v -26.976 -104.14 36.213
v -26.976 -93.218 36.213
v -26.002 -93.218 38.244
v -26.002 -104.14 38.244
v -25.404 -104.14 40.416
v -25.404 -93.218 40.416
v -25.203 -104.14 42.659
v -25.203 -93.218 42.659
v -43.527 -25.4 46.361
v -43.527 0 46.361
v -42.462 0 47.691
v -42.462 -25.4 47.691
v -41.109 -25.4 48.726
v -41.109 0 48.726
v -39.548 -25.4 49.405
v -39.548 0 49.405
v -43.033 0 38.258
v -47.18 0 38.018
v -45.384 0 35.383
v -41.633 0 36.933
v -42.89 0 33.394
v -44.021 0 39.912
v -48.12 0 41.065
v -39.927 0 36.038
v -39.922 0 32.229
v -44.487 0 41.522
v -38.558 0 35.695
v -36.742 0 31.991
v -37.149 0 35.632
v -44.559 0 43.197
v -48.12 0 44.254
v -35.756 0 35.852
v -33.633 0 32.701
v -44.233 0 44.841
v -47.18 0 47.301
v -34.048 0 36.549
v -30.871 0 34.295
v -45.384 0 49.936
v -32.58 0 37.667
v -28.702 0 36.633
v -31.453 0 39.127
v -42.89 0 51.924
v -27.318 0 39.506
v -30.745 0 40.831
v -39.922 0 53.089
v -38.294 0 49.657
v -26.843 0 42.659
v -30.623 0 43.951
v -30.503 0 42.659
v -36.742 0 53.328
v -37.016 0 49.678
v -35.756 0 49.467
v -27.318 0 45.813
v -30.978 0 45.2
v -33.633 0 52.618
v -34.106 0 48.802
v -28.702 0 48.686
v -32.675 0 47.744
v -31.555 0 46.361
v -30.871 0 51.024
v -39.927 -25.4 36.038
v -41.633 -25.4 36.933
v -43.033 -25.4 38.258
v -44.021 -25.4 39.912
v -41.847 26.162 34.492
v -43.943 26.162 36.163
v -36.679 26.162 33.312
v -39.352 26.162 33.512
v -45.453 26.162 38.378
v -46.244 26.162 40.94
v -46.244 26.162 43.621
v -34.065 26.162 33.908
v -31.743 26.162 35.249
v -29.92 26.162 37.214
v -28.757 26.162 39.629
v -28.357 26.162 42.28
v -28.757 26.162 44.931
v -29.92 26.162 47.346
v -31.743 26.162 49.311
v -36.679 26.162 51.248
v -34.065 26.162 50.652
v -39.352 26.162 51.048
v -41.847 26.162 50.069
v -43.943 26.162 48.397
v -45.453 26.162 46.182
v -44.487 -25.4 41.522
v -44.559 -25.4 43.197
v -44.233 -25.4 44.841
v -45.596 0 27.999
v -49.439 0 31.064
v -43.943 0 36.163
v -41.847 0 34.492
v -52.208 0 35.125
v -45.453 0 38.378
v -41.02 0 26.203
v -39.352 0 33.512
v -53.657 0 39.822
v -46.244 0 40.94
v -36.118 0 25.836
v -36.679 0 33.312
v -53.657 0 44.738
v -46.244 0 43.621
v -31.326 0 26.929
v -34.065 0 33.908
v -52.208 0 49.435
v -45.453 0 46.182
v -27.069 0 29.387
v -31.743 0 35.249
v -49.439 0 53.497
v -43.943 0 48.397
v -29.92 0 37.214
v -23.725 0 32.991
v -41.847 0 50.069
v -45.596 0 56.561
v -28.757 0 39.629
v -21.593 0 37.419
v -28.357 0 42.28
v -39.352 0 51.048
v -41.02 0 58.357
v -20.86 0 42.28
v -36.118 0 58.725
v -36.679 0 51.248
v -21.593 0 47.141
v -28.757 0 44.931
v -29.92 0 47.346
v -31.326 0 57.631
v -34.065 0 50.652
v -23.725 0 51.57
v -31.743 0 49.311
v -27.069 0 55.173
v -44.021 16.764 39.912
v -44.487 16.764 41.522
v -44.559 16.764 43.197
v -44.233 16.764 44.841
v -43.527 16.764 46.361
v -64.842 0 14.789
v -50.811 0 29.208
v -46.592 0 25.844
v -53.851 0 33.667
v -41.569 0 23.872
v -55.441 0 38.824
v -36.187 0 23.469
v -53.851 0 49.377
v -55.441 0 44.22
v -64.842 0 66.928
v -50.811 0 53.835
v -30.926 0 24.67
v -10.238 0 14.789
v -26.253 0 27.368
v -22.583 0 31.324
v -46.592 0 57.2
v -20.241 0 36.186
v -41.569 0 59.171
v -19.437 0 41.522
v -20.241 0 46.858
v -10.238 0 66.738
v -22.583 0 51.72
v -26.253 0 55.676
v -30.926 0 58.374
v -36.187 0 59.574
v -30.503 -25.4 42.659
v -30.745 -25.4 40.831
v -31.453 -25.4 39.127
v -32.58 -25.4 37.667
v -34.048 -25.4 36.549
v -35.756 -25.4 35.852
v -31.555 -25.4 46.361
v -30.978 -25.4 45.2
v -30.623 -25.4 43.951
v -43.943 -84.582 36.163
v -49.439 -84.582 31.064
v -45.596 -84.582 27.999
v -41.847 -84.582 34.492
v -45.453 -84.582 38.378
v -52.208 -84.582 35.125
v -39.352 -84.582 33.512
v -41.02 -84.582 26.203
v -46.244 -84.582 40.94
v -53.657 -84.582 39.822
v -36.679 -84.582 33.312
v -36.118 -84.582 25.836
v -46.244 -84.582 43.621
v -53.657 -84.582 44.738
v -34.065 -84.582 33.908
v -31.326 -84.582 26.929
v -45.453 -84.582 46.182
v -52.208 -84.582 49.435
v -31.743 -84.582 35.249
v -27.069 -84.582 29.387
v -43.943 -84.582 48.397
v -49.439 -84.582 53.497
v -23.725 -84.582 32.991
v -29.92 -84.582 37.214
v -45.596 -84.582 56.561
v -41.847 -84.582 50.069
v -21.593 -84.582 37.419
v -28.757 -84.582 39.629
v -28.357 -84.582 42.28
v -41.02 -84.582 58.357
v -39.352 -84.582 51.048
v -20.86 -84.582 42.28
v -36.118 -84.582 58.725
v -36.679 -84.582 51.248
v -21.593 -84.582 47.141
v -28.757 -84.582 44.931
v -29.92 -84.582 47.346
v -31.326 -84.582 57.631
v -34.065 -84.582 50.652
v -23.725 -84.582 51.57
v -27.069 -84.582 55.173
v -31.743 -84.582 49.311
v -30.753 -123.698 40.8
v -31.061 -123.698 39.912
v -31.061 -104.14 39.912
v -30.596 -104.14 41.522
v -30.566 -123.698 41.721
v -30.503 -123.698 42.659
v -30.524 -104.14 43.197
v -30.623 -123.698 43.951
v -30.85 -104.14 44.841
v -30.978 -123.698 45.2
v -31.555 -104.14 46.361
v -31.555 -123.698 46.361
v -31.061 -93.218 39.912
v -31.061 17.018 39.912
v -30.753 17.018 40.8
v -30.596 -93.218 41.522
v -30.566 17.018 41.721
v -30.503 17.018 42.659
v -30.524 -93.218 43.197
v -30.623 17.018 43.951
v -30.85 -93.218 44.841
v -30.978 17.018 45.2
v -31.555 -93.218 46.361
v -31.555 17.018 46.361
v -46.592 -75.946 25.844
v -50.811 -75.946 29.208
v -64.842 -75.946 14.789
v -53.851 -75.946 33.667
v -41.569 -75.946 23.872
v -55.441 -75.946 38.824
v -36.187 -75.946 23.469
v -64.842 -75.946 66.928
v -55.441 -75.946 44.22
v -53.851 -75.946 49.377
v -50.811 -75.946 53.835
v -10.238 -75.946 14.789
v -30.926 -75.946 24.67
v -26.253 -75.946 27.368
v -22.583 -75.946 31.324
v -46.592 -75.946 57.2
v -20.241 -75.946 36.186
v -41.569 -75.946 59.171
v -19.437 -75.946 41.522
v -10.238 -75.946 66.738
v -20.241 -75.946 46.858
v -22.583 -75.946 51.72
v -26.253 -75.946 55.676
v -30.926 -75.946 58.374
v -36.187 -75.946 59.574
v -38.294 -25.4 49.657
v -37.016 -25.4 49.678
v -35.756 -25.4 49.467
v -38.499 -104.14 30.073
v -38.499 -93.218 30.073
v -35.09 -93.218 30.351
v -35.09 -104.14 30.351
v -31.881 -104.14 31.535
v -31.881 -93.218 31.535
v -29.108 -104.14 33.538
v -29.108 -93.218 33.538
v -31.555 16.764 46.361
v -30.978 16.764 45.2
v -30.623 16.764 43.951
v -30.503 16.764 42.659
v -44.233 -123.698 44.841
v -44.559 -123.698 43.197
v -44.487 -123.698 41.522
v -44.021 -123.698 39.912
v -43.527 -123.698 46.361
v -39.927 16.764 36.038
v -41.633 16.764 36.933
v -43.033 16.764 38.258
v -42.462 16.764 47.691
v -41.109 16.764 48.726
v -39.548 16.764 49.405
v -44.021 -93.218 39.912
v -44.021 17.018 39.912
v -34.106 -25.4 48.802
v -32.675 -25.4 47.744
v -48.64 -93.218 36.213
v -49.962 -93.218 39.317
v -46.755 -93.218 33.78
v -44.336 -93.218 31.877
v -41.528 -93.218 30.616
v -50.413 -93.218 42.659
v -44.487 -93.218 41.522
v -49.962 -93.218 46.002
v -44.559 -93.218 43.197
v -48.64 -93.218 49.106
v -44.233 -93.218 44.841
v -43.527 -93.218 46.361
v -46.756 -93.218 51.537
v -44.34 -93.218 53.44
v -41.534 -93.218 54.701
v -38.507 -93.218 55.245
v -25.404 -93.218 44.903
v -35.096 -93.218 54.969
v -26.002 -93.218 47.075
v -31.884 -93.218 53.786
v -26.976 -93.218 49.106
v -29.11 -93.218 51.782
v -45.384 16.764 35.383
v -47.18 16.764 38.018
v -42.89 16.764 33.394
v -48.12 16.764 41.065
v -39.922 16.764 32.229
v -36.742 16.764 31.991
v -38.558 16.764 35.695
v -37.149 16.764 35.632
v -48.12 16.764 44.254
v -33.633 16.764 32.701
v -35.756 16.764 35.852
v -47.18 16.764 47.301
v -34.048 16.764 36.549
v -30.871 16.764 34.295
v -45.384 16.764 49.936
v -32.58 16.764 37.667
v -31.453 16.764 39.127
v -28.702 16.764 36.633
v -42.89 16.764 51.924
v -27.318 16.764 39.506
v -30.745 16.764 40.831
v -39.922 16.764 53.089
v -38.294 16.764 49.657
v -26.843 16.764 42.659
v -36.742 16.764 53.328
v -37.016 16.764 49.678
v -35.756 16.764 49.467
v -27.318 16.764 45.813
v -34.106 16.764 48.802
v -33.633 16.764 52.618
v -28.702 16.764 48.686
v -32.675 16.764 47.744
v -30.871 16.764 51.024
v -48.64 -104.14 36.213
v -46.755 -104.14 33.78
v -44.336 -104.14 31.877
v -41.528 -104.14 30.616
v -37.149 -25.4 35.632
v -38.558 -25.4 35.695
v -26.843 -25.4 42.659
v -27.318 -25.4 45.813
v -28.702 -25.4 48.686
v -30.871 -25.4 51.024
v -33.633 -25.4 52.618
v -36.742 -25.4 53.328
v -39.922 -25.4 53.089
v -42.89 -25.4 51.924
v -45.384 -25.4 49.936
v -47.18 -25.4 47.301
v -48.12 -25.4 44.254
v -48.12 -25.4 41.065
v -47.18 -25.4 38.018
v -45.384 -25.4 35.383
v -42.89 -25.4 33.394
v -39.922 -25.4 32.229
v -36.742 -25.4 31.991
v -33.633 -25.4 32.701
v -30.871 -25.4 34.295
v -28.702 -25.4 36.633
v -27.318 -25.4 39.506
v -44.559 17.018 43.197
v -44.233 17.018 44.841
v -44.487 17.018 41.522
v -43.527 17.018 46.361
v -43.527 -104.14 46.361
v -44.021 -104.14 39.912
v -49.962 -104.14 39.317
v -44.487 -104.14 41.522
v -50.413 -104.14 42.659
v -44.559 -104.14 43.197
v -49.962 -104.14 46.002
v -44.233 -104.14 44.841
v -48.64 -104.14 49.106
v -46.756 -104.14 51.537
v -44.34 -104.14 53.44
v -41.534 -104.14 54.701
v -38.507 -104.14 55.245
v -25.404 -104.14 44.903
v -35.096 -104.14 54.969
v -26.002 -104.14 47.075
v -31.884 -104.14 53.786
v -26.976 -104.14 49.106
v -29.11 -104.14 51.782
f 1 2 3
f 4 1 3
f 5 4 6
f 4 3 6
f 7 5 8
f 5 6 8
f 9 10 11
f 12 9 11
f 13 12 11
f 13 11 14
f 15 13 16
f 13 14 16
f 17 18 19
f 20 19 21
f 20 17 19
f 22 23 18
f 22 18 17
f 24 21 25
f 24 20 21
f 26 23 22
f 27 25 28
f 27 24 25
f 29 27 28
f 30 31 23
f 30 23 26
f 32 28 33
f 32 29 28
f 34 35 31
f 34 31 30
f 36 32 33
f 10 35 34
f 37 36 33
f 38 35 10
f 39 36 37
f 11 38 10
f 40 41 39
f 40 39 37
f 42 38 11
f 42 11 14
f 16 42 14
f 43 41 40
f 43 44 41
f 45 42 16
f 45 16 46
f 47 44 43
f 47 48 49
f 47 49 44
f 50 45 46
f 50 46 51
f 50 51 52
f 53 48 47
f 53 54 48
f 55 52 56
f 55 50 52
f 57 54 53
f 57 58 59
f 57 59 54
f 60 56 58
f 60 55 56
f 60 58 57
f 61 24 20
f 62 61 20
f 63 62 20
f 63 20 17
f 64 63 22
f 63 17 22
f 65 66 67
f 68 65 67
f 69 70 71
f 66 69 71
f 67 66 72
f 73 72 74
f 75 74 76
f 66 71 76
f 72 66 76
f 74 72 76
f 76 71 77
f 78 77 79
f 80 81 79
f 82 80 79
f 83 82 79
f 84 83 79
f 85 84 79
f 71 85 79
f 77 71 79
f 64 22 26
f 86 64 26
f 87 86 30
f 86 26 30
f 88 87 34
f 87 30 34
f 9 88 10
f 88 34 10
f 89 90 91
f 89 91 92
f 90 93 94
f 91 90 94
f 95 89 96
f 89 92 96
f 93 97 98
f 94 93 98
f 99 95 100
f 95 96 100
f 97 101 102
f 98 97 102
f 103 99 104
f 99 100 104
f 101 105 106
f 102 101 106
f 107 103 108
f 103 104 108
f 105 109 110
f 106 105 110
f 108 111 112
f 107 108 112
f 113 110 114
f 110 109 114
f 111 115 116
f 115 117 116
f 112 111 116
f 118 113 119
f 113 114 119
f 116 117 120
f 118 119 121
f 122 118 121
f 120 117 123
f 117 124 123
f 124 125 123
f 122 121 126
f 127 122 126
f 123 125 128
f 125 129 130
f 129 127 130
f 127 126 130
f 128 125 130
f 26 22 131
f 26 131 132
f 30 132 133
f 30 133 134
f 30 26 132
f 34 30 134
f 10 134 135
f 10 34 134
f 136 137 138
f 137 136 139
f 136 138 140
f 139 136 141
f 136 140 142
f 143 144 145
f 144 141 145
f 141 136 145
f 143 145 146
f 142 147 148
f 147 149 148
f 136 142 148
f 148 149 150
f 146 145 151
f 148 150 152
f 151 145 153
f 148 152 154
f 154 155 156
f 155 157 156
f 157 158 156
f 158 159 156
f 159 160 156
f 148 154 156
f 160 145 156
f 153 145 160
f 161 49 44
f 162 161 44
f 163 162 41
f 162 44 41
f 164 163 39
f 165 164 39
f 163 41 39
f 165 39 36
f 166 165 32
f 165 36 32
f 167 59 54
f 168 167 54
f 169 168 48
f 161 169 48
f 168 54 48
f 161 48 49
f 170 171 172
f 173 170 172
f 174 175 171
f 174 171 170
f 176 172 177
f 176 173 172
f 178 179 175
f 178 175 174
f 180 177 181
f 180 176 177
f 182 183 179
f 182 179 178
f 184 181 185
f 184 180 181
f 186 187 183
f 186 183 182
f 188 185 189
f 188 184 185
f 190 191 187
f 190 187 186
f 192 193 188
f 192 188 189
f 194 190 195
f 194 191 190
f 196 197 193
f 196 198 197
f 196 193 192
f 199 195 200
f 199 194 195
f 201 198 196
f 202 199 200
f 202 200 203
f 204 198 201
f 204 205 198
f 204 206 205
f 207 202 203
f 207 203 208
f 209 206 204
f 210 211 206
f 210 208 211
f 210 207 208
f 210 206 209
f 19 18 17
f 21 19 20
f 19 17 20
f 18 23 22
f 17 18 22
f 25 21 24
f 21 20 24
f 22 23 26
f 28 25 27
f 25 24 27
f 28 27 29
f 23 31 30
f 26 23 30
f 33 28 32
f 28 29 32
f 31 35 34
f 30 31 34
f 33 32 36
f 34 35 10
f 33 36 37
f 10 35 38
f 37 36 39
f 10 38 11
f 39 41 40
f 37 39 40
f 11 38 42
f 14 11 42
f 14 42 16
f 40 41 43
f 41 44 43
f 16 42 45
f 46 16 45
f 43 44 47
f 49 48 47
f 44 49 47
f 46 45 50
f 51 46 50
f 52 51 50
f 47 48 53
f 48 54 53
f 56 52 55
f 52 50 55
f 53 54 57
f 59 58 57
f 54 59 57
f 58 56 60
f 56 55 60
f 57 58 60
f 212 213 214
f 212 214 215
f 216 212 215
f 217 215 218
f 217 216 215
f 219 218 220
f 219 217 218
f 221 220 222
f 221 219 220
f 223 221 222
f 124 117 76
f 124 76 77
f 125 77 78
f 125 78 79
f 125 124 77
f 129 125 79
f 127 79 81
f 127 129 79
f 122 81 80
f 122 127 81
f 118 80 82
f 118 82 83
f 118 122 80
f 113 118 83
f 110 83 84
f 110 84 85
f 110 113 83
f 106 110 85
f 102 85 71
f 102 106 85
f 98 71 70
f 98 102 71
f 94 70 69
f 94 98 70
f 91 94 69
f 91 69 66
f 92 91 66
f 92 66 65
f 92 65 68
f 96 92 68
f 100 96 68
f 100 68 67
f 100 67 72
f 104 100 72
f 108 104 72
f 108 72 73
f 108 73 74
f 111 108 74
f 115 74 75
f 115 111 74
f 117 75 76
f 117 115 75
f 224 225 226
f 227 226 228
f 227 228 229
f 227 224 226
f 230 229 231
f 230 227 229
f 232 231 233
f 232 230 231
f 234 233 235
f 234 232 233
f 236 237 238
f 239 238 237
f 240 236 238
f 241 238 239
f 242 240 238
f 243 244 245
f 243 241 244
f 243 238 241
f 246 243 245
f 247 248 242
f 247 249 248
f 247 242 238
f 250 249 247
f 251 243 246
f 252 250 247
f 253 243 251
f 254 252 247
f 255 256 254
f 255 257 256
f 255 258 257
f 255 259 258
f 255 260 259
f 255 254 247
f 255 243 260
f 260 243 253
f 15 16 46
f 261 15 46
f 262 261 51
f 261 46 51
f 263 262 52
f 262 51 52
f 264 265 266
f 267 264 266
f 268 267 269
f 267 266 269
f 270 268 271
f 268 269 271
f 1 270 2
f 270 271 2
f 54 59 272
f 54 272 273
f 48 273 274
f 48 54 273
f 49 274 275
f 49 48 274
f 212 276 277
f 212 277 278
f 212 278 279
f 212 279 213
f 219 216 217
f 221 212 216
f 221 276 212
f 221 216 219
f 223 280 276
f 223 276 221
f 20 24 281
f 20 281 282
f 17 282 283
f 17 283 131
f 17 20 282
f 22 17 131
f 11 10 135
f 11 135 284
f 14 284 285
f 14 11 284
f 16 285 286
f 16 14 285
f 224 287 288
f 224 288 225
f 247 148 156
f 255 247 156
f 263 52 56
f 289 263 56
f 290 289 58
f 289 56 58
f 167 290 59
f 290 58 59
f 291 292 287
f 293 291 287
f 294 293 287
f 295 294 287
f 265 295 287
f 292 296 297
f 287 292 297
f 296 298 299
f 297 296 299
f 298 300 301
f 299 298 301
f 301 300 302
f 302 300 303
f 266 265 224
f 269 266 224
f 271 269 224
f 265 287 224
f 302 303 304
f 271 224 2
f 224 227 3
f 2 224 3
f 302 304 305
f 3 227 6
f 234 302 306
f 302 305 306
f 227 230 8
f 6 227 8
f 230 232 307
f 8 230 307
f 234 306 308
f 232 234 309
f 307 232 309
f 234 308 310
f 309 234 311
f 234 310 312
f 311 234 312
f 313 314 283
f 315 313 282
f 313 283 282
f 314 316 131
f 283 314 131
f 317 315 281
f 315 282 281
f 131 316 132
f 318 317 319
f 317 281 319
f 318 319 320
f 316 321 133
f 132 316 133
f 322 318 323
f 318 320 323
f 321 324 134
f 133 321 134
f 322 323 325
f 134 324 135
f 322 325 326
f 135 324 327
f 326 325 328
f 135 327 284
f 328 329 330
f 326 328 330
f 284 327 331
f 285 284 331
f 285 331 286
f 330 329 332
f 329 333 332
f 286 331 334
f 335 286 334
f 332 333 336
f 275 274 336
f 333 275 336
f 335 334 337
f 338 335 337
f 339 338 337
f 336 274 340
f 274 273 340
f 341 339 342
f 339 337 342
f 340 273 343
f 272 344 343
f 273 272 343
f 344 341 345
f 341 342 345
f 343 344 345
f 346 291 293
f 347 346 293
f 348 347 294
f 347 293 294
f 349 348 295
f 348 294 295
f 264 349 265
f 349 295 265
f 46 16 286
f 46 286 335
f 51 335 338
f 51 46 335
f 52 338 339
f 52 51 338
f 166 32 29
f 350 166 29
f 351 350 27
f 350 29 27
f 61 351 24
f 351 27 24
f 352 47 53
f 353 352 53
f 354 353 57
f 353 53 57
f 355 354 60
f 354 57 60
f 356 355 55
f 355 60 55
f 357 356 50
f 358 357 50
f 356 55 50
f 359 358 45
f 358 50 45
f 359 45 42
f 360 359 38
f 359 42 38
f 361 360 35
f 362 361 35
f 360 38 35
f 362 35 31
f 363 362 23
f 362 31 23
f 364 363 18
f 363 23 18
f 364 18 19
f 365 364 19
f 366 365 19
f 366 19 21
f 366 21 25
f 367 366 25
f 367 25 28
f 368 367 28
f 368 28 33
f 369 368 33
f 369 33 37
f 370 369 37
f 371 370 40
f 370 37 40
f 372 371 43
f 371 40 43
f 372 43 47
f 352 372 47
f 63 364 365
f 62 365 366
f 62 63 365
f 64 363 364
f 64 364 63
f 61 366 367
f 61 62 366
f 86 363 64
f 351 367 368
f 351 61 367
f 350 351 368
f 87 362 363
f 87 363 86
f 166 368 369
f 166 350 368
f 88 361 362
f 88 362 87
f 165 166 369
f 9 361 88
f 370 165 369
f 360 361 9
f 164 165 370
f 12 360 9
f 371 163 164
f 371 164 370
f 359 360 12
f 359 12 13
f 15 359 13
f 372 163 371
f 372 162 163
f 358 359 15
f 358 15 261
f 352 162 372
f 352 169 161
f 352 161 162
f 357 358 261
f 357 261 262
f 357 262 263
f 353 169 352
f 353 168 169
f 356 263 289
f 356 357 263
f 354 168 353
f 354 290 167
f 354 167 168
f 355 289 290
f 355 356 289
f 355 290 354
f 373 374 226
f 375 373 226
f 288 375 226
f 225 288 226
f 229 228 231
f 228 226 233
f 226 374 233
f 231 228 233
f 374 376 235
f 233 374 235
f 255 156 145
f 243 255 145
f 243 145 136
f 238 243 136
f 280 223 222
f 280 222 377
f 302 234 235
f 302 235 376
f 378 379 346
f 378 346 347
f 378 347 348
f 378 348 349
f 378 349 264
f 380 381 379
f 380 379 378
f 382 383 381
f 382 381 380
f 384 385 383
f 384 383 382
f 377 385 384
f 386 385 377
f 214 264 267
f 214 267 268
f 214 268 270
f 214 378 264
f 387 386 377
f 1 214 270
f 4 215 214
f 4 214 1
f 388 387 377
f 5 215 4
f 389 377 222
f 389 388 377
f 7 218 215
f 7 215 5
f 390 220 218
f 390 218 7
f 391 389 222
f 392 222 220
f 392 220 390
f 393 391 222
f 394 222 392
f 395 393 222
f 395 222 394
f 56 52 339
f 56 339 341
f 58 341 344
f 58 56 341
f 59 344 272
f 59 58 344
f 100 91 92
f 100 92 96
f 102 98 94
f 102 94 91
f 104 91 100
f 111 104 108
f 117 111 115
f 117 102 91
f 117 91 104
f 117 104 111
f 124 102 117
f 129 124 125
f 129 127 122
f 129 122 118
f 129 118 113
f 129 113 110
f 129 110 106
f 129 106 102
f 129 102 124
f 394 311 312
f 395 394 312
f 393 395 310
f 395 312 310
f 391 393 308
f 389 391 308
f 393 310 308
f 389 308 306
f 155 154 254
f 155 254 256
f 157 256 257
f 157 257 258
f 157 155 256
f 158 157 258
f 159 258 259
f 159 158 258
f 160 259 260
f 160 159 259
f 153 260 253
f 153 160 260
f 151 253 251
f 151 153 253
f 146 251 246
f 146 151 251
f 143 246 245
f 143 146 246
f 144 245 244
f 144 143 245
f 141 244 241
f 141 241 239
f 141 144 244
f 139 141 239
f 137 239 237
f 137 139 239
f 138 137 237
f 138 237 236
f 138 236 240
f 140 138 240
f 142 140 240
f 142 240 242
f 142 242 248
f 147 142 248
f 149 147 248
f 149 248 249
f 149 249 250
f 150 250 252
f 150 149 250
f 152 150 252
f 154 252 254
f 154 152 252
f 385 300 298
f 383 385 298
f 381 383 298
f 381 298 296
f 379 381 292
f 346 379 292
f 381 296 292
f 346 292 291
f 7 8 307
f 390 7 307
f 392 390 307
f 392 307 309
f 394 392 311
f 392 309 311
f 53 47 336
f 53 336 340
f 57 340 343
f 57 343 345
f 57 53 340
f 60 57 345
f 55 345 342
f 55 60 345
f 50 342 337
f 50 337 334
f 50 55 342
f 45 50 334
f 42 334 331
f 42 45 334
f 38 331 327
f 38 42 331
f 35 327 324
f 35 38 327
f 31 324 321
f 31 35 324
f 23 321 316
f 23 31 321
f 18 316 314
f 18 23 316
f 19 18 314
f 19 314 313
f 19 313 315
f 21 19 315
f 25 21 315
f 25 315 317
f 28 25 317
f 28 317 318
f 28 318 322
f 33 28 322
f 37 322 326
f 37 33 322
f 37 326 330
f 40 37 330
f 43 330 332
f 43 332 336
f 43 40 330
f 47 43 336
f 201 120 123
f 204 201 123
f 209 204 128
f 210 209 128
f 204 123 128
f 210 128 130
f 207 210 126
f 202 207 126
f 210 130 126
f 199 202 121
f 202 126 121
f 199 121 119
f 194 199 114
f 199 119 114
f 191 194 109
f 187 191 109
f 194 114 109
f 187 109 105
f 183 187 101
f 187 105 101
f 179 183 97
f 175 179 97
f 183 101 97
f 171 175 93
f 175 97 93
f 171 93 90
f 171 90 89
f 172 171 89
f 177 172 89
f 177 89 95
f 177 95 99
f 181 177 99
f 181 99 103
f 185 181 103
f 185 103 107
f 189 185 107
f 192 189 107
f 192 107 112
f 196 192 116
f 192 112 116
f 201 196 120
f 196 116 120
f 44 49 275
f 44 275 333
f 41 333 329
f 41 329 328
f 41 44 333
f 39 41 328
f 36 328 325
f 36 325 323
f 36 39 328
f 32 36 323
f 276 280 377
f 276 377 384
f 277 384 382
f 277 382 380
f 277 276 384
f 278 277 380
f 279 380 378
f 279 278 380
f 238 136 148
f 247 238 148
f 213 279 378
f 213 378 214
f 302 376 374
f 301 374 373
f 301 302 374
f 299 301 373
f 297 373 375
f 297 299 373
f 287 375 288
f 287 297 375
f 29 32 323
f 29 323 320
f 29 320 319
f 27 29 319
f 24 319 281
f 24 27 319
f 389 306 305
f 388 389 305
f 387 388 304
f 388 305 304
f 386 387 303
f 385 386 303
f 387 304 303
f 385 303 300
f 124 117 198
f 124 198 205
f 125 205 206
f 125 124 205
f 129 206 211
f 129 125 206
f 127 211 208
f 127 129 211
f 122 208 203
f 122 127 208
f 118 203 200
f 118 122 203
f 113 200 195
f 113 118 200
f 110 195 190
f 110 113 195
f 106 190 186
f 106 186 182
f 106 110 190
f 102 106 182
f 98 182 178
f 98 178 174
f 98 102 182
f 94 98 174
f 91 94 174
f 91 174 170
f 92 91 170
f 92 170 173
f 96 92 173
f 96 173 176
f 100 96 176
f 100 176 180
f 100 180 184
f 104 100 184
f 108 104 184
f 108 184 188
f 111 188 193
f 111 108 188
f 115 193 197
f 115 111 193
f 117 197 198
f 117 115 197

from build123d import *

# Parameters (mm, degrees)
F0_R          = 18.1033036262
F1_DEPTH      = 75.946
F2_R          = 16.4905968826
F2_R_2        = 8.9933843483
F3_DEPTH      = 84.582
F5_DEPTH      = 123.698
F5_DEPTH_BACK = 17.018
F4_R          = 10.6982872112
F6_DEPTH      = 25.4
F7_DEPTH      = 16.764
F8_R          = 6.2538305337
F9_DEPTH      = 25.4
F11_DEPTH     = 26.162
F13_START     = 93.218
F13_DEPTH     = 10.922


with BuildPart() as f1:
    # F0 (on Front) → F1 (new body)
    with BuildSketch(Plane.XZ):
        Polygon((-10.2382469922, 66.7381957173), (-64.8422315717, 66.9277980924), (-64.8422315717, 14.7885782644), (-10.2382469922, 14.7885782644), align=None)
        with Locations((-37.5402383506, 41.5217764676)):
            Circle(F0_R, mode=Mode.SUBTRACT)
    extrude(amount=F1_DEPTH)


with BuildPart() as f3:
    # F2 (on Front) → F3 (new body)
    with BuildSketch(Plane.XZ):
        with Locations((-37.3506397009, 42.2801636159)):
            Circle(F2_R)
        with Locations((-37.3506397009, 42.2801636159)):
            Circle(F2_R_2, mode=Mode.SUBTRACT)
    extrude(amount=F3_DEPTH)


with BuildPart() as f5:
    # F4 (on Front) → F5 (new body, two sides)
    with BuildSketch(Plane.XZ) as f5_sk:
        with BuildLine():
            ThreePointArc((-31.0614962405, 39.9119837554), (-30.6441246123, 41.2575880214), (-30.5031173675, 42.6593607824))
            ThreePointArc((-30.5031173675, 42.6593607824), (-30.7713050095, 44.5837166187), (-31.5554293296, 46.3614171127))
            Line((-31.5554293296, 46.3614171127), (-35.7555635273, 46.3614171127))
            Line((-35.7555635273, 46.3614171127), (-39.5475067198, 46.3614171127))
            Line((-39.5475067198, 46.3614171127), (-43.5270319157, 46.3614171127))
            ThreePointArc((-43.5270319157, 46.3614171127), (-44.5587937734, 43.1968043768), (-44.0209650048, 39.9119837554))
            Line((-44.0209650048, 39.9119837554), (-39.926700294, 39.9119837554))
            Line((-39.926700294, 39.9119837554), (-35.7555635273, 39.9119837554))
            Line((-35.7555635273, 39.9119837554), (-31.0614962405, 39.9119837554))
        make_face()
    extrude(amount=F5_DEPTH)
    extrude(f5_sk.sketch, amount=-F5_DEPTH_BACK)

    # F12 (on Front) → F13 (join)
    with BuildSketch(Plane.XZ.offset(F13_START)):
        with BuildLine():
            ThreePointArc((-26.9761793339, 36.2130589783), (-25.6544752033, 39.3165140209), (-25.2031331484, 42.6593609154))
            ThreePointArc((-25.2031331484, 42.6593609154), (-25.6544752033, 46.0022078099), (-26.9761793339, 49.1056628525))
            Line((-26.9761793339, 49.1056628525), (-28.9843862384, 42.469765991))
            Line((-28.9843862384, 42.469765991), (-26.9761793339, 36.2130589783))
        make_face()
        with BuildLine():
            Line((-32.8158922493, 50.8729223566), (-26.9761793339, 49.1056628525))
            ThreePointArc((-26.9761793339, 49.1056628525), (-31.8842690083, 53.7856309741), (-38.5070915076, 55.2449691852))
            Line((-38.5070915076, 55.2449691852), (-32.8158922493, 50.8729223566))
        make_face()
        Polygon((-28.9843862384, 42.469765991), (-26.9761793339, 49.1056628525), (-32.8158922493, 50.8729223566), (-38.5070915076, 55.2449691852), (-43.243739754, 49.1056628525), (-48.6400909698, 49.1056628525), (-46.4668907225, 42.469765991), (-48.6400909698, 36.2130589783), (-43.243739754, 34.338694113), (-38.4988303115, 30.0732965702), (-32.8158922493, 34.338694113), (-26.9761793339, 36.2130589783), align=None)
        with BuildLine():
            ThreePointArc((-38.4988303115, 30.0732965702), (-31.8806177506, 31.5350356341), (-26.9761793339, 36.2130589783))
            Line((-26.9761793339, 36.2130589783), (-32.8158922493, 34.338694113))
            Line((-32.8158922493, 34.338694113), (-38.4988303115, 30.0732965702))
        make_face()
        with BuildLine():
            Line((-43.243739754, 49.1056628525), (-38.5070915076, 55.2449691852))
            ThreePointArc((-38.5070915076, 55.2449691852), (-44.3398466007, 53.4400297748), (-48.6400909698, 49.1056628525))
            Line((-48.6400909698, 49.1056628525), (-43.243739754, 49.1056628525))
        make_face()
        with BuildLine():
            ThreePointArc((-48.6400909698, 36.2130589783), (-44.3363080965, 31.8765489672), (-38.4988303115, 30.0732965702))
            Line((-38.4988303115, 30.0732965702), (-43.243739754, 34.338694113))
            Line((-43.243739754, 34.338694113), (-48.6400909698, 36.2130589783))
        make_face()
        with BuildLine():
            Line((-46.4668907225, 42.469765991), (-48.6400909698, 49.1056628525))
            ThreePointArc((-48.6400909698, 49.1056628525), (-50.4131371553, 42.6593609154), (-48.6400909698, 36.2130589783))
            Line((-48.6400909698, 36.2130589783), (-46.4668907225, 42.469765991))
        make_face()
    extrude(amount=F13_DEPTH)


with BuildPart() as f6:
    # F4 (on Front) → F6 (new body)
    with BuildSketch(Plane.XZ):
        with Locations((-37.5412306227, 42.6593607824)):
            Circle(F4_R)
        with BuildLine():
            ThreePointArc((-31.5554293296, 46.3614171127), (-30.7713050095, 44.5837166187), (-30.5031173675, 42.6593607824))
            ThreePointArc((-30.5031173675, 42.6593607824), (-30.6441246123, 41.2575880214), (-31.0614962405, 39.9119837554))
            ThreePointArc((-31.0614962405, 39.9119837554), (-32.9367743709, 37.3363897306), (-35.7555635273, 35.8515394557))
            ThreePointArc((-35.7555635273, 35.8515394557), (-37.8552648698, 35.6282569798), (-39.926700294, 36.0378373445))
            ThreePointArc((-39.926700294, 36.0378373445), (-42.378607322, 37.5471376984), (-44.0209650048, 39.9119837554))
            ThreePointArc((-44.0209650048, 39.9119837554), (-44.5587937734, 43.1968043768), (-43.5270319157, 46.3614171127))
            ThreePointArc((-43.5270319157, 46.3614171127), (-41.8173128264, 48.2495449636), (-39.5475067198, 49.405462947))
            ThreePointArc((-39.5475067198, 49.405462947), (-37.6557705575, 49.6965419507), (-35.7555635273, 49.4671821092))
            ThreePointArc((-35.7555635273, 49.4671821092), (-33.3566907099, 48.3183946144), (-31.5554293296, 46.3614171127))
        make_face(mode=Mode.SUBTRACT)
    extrude(amount=F6_DEPTH)


with BuildPart() as f7:
    # F4 (on Front) → F7 (new body)
    with BuildSketch(Plane.XZ):
        with Locations((-37.5412306227, 42.6593607824)):
            Circle(F4_R)
        with BuildLine():
            ThreePointArc((-31.5554293296, 46.3614171127), (-30.7713050095, 44.5837166187), (-30.5031173675, 42.6593607824))
            ThreePointArc((-30.5031173675, 42.6593607824), (-30.6441246123, 41.2575880214), (-31.0614962405, 39.9119837554))
            ThreePointArc((-31.0614962405, 39.9119837554), (-32.9367743709, 37.3363897306), (-35.7555635273, 35.8515394557))
            ThreePointArc((-35.7555635273, 35.8515394557), (-37.8552648698, 35.6282569798), (-39.926700294, 36.0378373445))
            ThreePointArc((-39.926700294, 36.0378373445), (-42.378607322, 37.5471376984), (-44.0209650048, 39.9119837554))
            ThreePointArc((-44.0209650048, 39.9119837554), (-44.5587937734, 43.1968043768), (-43.5270319157, 46.3614171127))
            ThreePointArc((-43.5270319157, 46.3614171127), (-41.8173128264, 48.2495449636), (-39.5475067198, 49.405462947))
            ThreePointArc((-39.5475067198, 49.405462947), (-37.6557705575, 49.6965419507), (-35.7555635273, 49.4671821092))
            ThreePointArc((-35.7555635273, 49.4671821092), (-33.3566907099, 48.3183946144), (-31.5554293296, 46.3614171127))
        make_face(mode=Mode.SUBTRACT)
    extrude(amount=-F7_DEPTH)


with BuildPart() as f9:
    # F8 (on Top) → F9 (new body)
    with BuildSketch(Plane.XY):
        with Locations((-37.8851480782, 7.9380348325)):
            Circle(F8_R)
    extrude(amount=F9_DEPTH)


with BuildPart() as f11:
    # F2 (on Front) → F11 (new body)
    with BuildSketch(Plane.XZ):
        with Locations((-37.3506397009, 42.2801636159)):
            Circle(F2_R_2)
    extrude(amount=-F11_DEPTH)


solid = Compound([f1.part, f3.part, f5.part, f6.part, f7.part, f11.part])
